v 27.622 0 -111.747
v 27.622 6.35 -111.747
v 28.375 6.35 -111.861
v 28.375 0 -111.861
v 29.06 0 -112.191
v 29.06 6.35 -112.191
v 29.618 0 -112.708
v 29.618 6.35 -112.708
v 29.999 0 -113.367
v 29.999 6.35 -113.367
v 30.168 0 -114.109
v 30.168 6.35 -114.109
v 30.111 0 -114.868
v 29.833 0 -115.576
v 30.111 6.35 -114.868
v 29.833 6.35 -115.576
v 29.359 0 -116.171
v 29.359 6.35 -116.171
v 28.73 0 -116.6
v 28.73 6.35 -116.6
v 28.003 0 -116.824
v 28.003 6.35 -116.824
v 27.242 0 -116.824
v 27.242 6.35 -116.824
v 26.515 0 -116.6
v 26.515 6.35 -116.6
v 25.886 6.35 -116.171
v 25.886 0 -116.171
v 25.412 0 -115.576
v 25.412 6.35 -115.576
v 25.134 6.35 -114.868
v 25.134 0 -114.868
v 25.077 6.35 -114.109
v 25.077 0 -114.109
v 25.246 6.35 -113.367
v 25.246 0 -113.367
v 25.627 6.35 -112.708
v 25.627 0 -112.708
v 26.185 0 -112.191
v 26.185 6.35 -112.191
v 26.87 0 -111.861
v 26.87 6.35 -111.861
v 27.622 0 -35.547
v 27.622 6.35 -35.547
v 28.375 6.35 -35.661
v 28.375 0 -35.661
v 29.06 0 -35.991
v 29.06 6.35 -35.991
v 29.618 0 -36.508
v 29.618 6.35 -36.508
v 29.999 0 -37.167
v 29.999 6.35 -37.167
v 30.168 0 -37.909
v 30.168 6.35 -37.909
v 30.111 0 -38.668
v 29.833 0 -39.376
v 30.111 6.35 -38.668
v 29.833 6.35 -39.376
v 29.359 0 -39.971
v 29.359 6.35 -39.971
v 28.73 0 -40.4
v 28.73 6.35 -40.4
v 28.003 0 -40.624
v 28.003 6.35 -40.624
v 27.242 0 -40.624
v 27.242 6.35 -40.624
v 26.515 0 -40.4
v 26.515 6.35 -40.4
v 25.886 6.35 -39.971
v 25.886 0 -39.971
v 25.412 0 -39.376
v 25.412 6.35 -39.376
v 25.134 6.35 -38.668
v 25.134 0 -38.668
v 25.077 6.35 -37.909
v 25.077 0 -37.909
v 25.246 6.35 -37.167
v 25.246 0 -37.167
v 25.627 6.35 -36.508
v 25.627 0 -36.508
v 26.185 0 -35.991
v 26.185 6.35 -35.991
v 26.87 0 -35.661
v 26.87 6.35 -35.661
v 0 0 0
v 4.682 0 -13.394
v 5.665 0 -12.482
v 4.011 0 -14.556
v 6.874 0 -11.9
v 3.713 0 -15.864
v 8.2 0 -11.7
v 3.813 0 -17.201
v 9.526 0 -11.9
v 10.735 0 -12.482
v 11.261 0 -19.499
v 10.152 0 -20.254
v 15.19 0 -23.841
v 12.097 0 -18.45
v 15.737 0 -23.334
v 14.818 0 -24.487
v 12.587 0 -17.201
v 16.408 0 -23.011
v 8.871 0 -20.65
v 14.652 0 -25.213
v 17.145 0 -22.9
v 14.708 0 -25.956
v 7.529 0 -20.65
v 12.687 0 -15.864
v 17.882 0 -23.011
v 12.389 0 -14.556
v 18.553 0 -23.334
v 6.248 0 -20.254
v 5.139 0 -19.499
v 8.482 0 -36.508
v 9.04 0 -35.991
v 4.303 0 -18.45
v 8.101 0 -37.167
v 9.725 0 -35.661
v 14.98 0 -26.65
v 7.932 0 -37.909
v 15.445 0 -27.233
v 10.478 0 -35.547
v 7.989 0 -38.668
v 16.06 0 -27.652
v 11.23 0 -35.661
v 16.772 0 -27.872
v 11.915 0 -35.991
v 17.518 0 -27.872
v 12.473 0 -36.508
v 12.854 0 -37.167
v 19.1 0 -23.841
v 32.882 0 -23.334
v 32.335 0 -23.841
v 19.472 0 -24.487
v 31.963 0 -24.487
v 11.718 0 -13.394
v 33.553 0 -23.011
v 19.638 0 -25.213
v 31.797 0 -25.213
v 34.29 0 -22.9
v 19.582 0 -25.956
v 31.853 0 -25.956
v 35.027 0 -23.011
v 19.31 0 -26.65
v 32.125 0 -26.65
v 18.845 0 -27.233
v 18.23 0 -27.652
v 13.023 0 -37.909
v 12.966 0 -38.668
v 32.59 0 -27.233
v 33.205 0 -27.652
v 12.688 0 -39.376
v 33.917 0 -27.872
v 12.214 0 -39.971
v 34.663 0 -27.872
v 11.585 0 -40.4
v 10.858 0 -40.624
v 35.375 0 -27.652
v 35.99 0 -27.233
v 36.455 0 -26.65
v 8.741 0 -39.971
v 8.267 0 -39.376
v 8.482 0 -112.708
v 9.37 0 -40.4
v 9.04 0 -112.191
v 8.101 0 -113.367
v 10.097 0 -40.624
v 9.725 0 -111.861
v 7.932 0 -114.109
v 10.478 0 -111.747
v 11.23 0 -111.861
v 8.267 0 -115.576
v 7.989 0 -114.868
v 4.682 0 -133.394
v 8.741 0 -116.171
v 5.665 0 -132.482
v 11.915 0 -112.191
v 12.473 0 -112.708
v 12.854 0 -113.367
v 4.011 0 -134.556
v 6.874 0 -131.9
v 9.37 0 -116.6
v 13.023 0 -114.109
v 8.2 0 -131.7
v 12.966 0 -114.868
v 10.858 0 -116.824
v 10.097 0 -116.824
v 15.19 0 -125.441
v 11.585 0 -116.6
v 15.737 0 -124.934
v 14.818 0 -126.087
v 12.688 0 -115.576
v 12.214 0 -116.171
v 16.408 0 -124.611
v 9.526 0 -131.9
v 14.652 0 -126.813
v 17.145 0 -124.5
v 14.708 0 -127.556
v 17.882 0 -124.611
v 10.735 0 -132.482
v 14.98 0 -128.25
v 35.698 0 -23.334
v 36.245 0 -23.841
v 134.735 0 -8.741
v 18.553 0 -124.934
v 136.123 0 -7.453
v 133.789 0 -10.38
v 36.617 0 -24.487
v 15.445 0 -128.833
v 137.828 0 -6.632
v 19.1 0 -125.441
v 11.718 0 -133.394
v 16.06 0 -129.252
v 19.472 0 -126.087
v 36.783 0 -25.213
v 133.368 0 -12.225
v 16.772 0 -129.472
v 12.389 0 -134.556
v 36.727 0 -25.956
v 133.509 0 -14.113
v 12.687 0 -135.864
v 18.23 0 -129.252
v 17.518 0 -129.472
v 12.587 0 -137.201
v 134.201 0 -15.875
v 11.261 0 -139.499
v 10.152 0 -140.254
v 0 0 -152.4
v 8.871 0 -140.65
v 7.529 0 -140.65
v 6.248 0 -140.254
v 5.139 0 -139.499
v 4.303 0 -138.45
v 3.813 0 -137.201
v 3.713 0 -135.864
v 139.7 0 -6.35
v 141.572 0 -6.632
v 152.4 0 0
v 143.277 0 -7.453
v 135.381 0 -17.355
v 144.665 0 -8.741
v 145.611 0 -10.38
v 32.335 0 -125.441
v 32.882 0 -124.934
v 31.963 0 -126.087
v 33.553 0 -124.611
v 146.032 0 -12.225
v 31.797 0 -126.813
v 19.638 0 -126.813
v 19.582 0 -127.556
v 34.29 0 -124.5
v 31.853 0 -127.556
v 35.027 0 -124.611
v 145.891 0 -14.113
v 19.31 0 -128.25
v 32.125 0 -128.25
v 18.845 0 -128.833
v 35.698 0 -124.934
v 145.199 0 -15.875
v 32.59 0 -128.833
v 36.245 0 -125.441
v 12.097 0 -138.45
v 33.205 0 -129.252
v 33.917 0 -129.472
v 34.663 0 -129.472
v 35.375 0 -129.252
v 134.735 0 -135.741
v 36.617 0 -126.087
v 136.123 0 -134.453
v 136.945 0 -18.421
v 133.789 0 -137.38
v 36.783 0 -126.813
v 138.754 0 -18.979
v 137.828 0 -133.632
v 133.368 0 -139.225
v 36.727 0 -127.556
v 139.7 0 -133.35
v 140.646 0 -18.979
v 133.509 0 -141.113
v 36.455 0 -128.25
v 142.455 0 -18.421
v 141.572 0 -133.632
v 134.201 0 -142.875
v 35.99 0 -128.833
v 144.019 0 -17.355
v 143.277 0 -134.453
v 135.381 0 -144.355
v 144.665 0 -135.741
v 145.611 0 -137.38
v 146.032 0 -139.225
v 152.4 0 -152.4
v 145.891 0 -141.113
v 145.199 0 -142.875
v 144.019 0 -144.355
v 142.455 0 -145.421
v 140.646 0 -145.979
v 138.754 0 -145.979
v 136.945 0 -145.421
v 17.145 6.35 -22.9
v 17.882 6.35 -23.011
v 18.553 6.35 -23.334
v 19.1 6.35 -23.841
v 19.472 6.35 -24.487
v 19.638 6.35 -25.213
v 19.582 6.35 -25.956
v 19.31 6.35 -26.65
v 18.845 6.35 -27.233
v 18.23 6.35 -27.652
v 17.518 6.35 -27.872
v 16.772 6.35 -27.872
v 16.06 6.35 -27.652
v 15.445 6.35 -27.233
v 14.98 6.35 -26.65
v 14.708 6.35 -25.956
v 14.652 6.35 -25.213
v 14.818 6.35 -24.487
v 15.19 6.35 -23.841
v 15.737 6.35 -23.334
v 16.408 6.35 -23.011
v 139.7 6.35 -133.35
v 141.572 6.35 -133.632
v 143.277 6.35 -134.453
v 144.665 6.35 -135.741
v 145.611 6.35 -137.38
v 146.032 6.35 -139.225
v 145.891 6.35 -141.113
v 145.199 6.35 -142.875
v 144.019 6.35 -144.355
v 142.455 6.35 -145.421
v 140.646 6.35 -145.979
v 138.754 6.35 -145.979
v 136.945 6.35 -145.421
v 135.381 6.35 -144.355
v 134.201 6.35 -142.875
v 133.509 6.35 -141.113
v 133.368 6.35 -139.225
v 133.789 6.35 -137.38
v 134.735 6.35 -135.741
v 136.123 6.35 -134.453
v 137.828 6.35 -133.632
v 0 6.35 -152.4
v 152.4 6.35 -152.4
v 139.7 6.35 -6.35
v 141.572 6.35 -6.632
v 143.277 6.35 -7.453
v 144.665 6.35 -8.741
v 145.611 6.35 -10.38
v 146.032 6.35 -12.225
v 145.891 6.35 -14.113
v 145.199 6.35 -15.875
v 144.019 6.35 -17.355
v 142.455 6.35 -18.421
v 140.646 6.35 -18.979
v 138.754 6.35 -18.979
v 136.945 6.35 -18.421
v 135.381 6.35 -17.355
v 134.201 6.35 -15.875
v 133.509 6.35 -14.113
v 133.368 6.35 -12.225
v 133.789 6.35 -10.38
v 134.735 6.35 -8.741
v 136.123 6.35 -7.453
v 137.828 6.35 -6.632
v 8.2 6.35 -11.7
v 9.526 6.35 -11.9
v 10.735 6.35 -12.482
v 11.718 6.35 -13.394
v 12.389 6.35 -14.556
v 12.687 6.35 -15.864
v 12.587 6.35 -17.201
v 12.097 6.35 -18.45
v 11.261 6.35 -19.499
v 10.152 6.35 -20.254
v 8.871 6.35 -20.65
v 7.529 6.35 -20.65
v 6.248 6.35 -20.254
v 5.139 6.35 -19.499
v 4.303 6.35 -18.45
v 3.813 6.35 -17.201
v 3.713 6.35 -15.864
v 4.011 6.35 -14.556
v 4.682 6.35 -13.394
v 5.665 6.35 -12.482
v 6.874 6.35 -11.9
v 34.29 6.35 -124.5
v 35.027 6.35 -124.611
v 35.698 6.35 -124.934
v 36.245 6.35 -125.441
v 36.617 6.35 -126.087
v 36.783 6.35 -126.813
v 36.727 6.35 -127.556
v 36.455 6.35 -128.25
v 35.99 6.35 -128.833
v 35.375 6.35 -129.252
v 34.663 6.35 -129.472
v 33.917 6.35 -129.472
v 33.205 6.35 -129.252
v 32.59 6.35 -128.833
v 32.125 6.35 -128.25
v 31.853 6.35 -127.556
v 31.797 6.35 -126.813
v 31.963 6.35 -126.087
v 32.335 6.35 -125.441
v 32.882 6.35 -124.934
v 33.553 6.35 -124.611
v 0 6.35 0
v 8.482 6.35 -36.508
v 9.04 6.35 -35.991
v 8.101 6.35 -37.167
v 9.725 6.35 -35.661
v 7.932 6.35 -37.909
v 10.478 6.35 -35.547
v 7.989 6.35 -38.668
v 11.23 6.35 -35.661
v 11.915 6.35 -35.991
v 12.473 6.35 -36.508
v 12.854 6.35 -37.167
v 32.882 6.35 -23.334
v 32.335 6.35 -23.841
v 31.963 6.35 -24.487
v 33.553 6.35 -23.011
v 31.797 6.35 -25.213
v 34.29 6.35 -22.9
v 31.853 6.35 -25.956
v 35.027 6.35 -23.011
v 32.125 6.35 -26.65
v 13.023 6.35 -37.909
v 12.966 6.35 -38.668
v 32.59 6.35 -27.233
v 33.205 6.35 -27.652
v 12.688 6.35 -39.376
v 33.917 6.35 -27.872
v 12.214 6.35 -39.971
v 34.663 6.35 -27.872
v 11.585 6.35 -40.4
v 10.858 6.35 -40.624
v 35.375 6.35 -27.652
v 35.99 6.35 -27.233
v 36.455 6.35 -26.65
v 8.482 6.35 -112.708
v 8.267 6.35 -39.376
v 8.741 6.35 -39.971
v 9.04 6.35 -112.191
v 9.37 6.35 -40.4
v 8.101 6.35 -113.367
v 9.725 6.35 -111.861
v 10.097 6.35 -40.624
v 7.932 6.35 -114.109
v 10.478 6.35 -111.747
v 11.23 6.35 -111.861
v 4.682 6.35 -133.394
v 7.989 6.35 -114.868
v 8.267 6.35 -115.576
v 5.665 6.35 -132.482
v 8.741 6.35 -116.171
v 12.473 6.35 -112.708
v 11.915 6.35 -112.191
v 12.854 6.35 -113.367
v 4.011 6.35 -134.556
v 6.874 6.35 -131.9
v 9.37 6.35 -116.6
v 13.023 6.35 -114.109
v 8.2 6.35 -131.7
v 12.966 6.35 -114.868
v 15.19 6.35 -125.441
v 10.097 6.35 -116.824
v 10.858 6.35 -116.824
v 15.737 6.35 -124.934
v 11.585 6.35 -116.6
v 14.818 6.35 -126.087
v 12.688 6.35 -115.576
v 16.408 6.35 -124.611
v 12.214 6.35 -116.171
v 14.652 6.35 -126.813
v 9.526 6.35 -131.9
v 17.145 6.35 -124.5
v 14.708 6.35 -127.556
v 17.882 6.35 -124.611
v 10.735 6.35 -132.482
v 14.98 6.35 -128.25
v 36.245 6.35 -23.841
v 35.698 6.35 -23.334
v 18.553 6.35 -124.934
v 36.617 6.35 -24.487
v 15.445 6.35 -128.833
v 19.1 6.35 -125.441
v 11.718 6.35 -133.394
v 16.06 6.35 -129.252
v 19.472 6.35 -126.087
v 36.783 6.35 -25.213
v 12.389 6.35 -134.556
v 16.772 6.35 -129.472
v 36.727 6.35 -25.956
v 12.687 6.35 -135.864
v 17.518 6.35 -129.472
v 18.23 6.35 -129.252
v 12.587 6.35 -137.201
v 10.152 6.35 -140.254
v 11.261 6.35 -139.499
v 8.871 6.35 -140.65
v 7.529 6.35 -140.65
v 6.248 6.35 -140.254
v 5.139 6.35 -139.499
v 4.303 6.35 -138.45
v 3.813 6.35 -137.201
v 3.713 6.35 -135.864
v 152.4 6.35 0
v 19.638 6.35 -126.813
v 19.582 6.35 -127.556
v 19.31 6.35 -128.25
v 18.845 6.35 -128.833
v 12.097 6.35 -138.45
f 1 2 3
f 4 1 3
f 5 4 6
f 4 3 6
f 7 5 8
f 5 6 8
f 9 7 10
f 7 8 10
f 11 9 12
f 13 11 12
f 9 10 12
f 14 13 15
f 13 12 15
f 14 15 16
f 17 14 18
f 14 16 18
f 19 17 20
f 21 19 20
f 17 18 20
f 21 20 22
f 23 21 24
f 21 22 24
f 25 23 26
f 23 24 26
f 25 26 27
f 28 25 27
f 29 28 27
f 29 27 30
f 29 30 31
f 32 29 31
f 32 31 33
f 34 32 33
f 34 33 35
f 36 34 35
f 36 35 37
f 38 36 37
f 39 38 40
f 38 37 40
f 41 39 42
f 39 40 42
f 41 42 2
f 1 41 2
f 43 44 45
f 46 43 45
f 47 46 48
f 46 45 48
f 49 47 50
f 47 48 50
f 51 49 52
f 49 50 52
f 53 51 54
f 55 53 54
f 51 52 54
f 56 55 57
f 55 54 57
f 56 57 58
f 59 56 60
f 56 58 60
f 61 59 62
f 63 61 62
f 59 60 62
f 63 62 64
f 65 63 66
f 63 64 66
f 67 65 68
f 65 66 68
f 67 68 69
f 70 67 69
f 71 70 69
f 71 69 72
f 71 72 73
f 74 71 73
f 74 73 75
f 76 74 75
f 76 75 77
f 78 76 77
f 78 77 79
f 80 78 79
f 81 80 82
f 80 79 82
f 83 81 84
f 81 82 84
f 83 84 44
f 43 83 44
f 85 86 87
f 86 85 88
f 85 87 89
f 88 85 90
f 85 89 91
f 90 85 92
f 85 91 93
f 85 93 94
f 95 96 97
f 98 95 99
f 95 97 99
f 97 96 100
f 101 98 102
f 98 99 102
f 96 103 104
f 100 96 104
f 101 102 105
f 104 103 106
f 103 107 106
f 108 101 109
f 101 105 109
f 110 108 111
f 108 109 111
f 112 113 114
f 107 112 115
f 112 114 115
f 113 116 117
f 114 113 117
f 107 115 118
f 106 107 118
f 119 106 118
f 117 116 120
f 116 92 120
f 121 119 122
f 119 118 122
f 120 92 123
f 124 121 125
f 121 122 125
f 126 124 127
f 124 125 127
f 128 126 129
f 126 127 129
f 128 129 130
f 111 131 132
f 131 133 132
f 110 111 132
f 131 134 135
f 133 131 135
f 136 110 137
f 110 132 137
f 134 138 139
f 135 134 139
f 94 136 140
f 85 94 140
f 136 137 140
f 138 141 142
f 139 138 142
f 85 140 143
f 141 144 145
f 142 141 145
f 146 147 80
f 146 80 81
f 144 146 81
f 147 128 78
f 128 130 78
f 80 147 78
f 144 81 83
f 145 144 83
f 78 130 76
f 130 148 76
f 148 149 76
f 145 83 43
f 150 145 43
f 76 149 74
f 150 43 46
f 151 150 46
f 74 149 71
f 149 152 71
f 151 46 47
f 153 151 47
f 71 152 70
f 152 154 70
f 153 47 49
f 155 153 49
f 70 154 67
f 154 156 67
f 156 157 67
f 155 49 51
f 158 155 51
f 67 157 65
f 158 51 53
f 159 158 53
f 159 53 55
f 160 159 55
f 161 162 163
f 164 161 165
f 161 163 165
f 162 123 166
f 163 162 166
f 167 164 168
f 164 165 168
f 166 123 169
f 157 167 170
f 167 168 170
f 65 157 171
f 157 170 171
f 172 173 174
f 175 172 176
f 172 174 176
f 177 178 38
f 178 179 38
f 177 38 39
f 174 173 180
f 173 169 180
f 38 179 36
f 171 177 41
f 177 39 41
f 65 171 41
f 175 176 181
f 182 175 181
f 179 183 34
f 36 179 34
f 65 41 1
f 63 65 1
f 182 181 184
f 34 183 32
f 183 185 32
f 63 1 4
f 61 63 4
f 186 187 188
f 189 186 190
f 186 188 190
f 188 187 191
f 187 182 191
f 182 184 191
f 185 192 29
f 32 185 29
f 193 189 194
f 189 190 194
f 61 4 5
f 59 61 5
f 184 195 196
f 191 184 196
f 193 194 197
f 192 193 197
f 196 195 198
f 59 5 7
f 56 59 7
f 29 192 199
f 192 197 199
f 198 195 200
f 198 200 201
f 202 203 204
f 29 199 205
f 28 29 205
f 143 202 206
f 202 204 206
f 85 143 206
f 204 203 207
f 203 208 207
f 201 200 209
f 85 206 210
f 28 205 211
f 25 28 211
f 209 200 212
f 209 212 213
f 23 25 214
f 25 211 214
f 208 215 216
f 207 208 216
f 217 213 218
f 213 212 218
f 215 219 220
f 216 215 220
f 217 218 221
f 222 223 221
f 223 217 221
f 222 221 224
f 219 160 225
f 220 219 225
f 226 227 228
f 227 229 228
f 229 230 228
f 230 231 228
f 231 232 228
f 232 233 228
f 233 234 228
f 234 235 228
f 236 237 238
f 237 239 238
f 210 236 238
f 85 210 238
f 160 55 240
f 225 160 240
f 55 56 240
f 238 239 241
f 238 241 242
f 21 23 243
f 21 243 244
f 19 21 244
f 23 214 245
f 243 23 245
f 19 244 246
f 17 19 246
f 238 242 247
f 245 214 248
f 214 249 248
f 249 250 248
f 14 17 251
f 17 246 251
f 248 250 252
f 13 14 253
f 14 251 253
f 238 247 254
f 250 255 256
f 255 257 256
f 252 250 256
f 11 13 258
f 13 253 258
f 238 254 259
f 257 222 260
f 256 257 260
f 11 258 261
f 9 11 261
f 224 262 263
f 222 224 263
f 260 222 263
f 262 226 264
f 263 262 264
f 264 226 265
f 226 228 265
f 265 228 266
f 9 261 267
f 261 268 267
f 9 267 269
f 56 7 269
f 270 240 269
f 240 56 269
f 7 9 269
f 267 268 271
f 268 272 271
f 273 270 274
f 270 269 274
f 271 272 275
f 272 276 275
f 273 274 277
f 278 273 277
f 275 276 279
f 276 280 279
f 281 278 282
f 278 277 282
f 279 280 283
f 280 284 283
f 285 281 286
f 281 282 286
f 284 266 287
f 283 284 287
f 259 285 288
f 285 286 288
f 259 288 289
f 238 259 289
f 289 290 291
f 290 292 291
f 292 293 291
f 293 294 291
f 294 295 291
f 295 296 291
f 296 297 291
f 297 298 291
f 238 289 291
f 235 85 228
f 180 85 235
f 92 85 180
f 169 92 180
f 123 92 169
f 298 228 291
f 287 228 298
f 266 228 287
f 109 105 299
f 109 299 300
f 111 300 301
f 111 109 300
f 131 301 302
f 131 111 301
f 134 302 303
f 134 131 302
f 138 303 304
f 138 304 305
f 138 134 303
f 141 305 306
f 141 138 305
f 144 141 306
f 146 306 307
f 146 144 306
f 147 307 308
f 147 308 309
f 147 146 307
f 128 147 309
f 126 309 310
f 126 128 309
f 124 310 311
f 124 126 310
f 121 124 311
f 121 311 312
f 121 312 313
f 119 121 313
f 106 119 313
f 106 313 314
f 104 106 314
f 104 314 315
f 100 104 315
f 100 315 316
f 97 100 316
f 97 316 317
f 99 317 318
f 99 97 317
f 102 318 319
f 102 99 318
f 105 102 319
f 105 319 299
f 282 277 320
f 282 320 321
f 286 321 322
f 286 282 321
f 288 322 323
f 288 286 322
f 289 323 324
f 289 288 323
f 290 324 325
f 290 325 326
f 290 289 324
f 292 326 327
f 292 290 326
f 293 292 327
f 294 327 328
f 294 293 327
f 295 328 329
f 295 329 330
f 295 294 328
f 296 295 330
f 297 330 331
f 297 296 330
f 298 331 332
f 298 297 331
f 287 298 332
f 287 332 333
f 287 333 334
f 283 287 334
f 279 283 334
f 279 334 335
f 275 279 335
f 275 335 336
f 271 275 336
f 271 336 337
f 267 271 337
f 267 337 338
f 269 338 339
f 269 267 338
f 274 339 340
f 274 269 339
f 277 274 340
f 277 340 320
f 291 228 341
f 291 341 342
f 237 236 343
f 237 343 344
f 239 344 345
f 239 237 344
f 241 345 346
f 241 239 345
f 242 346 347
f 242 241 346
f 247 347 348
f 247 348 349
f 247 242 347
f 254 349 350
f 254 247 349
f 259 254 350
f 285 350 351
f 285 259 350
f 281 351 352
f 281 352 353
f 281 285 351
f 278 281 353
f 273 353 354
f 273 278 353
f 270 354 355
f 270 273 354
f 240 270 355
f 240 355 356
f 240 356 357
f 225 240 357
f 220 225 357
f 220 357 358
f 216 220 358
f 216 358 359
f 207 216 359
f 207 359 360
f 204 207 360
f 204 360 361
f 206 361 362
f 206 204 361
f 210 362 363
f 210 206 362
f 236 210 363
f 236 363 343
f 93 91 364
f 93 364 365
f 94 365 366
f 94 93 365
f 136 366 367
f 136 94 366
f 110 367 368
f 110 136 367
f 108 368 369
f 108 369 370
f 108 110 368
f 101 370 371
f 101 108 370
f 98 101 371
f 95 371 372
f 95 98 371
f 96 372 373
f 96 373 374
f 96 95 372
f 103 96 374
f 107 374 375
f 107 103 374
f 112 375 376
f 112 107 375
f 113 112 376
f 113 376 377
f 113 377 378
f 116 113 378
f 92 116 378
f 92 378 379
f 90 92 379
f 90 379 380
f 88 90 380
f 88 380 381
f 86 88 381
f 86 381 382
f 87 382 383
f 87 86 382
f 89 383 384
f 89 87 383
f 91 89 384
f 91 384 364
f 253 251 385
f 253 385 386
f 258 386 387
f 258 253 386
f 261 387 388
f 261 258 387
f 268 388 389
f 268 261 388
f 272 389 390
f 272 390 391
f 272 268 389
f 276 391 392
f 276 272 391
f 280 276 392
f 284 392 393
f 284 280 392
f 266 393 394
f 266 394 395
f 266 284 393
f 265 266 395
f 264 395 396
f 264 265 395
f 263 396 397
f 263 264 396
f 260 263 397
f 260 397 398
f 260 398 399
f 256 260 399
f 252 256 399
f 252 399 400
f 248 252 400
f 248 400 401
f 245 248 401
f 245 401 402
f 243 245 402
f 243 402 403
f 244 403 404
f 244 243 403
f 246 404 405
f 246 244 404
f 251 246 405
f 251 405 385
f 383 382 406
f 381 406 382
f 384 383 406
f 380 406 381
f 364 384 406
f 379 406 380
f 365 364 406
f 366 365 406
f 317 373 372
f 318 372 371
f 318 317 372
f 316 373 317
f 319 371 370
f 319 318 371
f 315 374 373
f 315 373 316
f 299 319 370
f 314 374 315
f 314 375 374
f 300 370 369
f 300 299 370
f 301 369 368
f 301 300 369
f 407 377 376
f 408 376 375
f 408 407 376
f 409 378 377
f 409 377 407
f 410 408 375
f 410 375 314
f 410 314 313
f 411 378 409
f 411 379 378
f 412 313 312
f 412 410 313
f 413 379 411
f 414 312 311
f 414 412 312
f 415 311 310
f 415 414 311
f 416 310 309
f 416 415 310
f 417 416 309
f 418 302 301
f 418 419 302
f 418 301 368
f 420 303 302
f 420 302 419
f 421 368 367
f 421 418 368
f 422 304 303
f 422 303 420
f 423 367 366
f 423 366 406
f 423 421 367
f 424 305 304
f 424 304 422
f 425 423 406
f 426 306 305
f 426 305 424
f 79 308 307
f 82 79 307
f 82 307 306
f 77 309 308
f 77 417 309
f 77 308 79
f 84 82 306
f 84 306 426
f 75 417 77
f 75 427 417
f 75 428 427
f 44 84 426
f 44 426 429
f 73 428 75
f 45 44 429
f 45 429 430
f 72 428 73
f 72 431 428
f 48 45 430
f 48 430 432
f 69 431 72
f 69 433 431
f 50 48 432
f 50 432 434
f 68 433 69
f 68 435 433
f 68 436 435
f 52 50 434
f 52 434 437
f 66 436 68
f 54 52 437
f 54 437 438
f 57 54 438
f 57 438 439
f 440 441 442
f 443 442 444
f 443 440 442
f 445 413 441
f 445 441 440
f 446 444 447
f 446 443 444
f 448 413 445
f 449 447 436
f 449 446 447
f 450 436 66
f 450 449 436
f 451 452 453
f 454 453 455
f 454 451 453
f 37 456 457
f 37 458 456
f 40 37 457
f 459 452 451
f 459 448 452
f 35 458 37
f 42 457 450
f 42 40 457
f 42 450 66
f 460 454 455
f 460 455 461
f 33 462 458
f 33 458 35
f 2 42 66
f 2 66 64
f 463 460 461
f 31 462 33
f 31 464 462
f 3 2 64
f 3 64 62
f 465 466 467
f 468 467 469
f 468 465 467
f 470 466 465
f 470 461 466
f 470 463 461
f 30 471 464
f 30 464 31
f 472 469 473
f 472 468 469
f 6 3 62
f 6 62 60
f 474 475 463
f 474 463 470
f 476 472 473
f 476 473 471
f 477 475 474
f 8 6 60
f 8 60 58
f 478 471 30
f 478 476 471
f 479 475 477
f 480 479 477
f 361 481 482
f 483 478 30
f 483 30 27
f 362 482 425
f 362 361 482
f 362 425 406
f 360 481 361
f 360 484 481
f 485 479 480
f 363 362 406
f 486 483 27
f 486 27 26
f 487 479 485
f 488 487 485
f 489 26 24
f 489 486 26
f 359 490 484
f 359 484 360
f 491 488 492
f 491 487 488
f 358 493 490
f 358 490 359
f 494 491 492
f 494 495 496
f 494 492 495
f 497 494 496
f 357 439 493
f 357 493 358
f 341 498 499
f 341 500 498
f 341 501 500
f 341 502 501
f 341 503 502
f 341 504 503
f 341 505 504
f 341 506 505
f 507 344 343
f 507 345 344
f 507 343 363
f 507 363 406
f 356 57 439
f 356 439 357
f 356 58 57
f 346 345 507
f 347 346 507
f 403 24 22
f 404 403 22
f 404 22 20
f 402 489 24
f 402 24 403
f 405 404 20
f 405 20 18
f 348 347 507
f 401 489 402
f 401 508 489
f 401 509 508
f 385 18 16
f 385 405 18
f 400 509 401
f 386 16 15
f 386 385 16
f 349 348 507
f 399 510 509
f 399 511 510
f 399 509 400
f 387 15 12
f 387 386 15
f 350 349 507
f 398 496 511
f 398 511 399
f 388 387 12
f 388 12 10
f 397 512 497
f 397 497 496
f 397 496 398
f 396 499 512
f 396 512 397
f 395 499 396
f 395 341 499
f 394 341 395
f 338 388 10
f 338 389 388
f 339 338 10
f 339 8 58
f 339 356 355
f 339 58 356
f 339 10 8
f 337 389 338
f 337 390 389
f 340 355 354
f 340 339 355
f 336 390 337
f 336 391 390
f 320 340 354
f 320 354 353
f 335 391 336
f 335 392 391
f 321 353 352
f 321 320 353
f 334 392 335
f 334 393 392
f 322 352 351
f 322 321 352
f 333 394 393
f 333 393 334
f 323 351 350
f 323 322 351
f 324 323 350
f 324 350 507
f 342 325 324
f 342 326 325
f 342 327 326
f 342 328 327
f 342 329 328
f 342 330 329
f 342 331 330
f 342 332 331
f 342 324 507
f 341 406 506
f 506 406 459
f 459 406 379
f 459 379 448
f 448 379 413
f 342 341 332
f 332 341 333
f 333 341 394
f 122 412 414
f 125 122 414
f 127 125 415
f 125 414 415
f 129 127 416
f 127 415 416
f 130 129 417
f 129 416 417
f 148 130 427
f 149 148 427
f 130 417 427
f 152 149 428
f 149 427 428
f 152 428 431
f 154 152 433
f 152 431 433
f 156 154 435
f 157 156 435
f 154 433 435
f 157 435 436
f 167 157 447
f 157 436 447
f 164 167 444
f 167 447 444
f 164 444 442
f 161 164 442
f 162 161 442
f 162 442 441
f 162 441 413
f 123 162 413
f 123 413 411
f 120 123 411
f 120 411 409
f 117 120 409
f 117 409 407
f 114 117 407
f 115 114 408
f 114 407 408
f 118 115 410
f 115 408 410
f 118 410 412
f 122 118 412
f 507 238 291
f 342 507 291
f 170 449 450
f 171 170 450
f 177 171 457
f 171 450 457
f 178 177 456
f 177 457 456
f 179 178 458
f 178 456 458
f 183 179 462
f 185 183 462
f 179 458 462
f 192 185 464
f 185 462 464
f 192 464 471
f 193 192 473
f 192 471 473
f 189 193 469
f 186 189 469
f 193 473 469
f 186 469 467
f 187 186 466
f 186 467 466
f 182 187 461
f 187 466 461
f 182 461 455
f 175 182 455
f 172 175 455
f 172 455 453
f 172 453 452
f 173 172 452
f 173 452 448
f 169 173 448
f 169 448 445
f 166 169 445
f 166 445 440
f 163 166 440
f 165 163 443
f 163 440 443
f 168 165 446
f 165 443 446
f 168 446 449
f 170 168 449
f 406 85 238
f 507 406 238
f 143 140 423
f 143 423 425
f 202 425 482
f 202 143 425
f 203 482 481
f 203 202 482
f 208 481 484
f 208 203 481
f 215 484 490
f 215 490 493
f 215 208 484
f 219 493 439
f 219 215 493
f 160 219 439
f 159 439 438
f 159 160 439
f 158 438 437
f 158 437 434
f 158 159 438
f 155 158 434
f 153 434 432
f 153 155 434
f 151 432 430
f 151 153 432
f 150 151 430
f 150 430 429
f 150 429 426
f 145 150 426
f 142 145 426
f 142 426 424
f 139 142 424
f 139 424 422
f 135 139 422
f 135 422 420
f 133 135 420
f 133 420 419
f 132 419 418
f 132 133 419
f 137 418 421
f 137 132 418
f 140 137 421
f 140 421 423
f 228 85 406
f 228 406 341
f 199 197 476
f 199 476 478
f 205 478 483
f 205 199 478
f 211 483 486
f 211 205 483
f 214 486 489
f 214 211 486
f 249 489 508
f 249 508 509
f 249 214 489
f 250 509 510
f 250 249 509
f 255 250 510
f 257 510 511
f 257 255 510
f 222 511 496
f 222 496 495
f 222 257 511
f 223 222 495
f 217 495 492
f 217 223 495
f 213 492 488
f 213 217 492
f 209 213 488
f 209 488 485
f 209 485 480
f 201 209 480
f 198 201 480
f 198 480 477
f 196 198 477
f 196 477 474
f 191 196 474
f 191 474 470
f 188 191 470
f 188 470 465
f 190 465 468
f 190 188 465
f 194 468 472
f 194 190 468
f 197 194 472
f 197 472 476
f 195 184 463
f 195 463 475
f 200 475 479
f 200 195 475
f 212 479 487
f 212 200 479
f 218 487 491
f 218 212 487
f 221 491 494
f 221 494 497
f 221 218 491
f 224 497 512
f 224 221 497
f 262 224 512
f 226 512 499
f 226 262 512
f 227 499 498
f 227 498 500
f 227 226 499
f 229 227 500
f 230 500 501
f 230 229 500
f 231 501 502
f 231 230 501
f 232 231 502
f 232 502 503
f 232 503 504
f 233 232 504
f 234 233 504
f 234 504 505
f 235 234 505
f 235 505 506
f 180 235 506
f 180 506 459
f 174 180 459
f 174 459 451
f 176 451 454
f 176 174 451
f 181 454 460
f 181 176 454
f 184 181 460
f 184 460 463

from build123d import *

# Parameters (mm, degrees)
SKETCH1_W           = 152.4
SKETCH1_H           = 152.4
SKETCH1_R           = 4.5
SKETCH1_R_2         = 2.5
SKETCH1_R_3         = 6.35
BOSS_EXTRUDE1_DEPTH = 6.35
SKETCH2_R           = 2.5527
CUT_EXTRUDE1_DEPTH  = 6.35


with BuildPart() as part:
    # Sketch1 → Boss-Extrude1 (new body)
    with BuildSketch(Plane(origin=(0, 0, 0), x_dir=(1, 0, 0), z_dir=(0, 1, 0))):
        with Locations((76.2, 76.2)):
            Rectangle(SKETCH1_W, SKETCH1_H)
        with Locations(Location((8.200009, 136.19988, 0), (0, 0, 270))):  # turned: the seam where the file's is
            Circle(SKETCH1_R, mode=Mode.SUBTRACT)
        with Locations(Location((8.200009, 16.200000112, 0), (0, 0, 270))):  # turned: the seam where the file's is
            Circle(SKETCH1_R, mode=Mode.SUBTRACT)
        with Locations(Location((17.145, 25.4, 0), (0, 0, 270))):  # turned: the seam where the file's is
            Circle(SKETCH1_R_2, mode=Mode.SUBTRACT)
        with Locations(Location((34.29, 25.4, 0), (0, 0, 270))):  # turned: the seam where the file's is
            Circle(SKETCH1_R_2, mode=Mode.SUBTRACT)
        with Locations(Location((17.145, 127, 0), (0, 0, 270))):  # turned: the seam where the file's is
            Circle(SKETCH1_R_2, mode=Mode.SUBTRACT)
        with Locations(Location((34.29, 127, 0), (0, 0, 270))):  # turned: the seam where the file's is
            Circle(SKETCH1_R_2, mode=Mode.SUBTRACT)
        with Locations(Location((139.7, 12.7, 0), (0, 0, 270))):  # turned: the seam where the file's is
            Circle(SKETCH1_R_3, mode=Mode.SUBTRACT)
        with Locations(Location((139.7, 139.7, 0), (0, 0, 270))):  # turned: the seam where the file's is
            Circle(SKETCH1_R_3, mode=Mode.SUBTRACT)
    extrude(amount=BOSS_EXTRUDE1_DEPTH)

    # Sketch2 → Cut-Extrude1 (cut)
    with BuildSketch(Plane(origin=(0, 6.35, 0), x_dir=(1, 0, 0), z_dir=(0, 1, 0))):
        with Locations(Location((10.4775, 114.3, 0), (0, 0, 270))):  # turned: the seam where the file's is
            Circle(SKETCH2_R)
        with Locations(Location((27.6225, 114.3, 0), (0, 0, 270))):  # turned: the seam where the file's is
            Circle(SKETCH2_R)
        with Locations(Location((10.4775, 38.1, 0), (0, 0, 270))):  # turned: the seam where the file's is
            Circle(SKETCH2_R)
        with Locations(Location((27.6225, 38.1, 0), (0, 0, 270))):  # turned: the seam where the file's is
            Circle(SKETCH2_R)
    extrude(amount=-CUT_EXTRUDE1_DEPTH, mode=Mode.SUBTRACT)


solid = part.part
